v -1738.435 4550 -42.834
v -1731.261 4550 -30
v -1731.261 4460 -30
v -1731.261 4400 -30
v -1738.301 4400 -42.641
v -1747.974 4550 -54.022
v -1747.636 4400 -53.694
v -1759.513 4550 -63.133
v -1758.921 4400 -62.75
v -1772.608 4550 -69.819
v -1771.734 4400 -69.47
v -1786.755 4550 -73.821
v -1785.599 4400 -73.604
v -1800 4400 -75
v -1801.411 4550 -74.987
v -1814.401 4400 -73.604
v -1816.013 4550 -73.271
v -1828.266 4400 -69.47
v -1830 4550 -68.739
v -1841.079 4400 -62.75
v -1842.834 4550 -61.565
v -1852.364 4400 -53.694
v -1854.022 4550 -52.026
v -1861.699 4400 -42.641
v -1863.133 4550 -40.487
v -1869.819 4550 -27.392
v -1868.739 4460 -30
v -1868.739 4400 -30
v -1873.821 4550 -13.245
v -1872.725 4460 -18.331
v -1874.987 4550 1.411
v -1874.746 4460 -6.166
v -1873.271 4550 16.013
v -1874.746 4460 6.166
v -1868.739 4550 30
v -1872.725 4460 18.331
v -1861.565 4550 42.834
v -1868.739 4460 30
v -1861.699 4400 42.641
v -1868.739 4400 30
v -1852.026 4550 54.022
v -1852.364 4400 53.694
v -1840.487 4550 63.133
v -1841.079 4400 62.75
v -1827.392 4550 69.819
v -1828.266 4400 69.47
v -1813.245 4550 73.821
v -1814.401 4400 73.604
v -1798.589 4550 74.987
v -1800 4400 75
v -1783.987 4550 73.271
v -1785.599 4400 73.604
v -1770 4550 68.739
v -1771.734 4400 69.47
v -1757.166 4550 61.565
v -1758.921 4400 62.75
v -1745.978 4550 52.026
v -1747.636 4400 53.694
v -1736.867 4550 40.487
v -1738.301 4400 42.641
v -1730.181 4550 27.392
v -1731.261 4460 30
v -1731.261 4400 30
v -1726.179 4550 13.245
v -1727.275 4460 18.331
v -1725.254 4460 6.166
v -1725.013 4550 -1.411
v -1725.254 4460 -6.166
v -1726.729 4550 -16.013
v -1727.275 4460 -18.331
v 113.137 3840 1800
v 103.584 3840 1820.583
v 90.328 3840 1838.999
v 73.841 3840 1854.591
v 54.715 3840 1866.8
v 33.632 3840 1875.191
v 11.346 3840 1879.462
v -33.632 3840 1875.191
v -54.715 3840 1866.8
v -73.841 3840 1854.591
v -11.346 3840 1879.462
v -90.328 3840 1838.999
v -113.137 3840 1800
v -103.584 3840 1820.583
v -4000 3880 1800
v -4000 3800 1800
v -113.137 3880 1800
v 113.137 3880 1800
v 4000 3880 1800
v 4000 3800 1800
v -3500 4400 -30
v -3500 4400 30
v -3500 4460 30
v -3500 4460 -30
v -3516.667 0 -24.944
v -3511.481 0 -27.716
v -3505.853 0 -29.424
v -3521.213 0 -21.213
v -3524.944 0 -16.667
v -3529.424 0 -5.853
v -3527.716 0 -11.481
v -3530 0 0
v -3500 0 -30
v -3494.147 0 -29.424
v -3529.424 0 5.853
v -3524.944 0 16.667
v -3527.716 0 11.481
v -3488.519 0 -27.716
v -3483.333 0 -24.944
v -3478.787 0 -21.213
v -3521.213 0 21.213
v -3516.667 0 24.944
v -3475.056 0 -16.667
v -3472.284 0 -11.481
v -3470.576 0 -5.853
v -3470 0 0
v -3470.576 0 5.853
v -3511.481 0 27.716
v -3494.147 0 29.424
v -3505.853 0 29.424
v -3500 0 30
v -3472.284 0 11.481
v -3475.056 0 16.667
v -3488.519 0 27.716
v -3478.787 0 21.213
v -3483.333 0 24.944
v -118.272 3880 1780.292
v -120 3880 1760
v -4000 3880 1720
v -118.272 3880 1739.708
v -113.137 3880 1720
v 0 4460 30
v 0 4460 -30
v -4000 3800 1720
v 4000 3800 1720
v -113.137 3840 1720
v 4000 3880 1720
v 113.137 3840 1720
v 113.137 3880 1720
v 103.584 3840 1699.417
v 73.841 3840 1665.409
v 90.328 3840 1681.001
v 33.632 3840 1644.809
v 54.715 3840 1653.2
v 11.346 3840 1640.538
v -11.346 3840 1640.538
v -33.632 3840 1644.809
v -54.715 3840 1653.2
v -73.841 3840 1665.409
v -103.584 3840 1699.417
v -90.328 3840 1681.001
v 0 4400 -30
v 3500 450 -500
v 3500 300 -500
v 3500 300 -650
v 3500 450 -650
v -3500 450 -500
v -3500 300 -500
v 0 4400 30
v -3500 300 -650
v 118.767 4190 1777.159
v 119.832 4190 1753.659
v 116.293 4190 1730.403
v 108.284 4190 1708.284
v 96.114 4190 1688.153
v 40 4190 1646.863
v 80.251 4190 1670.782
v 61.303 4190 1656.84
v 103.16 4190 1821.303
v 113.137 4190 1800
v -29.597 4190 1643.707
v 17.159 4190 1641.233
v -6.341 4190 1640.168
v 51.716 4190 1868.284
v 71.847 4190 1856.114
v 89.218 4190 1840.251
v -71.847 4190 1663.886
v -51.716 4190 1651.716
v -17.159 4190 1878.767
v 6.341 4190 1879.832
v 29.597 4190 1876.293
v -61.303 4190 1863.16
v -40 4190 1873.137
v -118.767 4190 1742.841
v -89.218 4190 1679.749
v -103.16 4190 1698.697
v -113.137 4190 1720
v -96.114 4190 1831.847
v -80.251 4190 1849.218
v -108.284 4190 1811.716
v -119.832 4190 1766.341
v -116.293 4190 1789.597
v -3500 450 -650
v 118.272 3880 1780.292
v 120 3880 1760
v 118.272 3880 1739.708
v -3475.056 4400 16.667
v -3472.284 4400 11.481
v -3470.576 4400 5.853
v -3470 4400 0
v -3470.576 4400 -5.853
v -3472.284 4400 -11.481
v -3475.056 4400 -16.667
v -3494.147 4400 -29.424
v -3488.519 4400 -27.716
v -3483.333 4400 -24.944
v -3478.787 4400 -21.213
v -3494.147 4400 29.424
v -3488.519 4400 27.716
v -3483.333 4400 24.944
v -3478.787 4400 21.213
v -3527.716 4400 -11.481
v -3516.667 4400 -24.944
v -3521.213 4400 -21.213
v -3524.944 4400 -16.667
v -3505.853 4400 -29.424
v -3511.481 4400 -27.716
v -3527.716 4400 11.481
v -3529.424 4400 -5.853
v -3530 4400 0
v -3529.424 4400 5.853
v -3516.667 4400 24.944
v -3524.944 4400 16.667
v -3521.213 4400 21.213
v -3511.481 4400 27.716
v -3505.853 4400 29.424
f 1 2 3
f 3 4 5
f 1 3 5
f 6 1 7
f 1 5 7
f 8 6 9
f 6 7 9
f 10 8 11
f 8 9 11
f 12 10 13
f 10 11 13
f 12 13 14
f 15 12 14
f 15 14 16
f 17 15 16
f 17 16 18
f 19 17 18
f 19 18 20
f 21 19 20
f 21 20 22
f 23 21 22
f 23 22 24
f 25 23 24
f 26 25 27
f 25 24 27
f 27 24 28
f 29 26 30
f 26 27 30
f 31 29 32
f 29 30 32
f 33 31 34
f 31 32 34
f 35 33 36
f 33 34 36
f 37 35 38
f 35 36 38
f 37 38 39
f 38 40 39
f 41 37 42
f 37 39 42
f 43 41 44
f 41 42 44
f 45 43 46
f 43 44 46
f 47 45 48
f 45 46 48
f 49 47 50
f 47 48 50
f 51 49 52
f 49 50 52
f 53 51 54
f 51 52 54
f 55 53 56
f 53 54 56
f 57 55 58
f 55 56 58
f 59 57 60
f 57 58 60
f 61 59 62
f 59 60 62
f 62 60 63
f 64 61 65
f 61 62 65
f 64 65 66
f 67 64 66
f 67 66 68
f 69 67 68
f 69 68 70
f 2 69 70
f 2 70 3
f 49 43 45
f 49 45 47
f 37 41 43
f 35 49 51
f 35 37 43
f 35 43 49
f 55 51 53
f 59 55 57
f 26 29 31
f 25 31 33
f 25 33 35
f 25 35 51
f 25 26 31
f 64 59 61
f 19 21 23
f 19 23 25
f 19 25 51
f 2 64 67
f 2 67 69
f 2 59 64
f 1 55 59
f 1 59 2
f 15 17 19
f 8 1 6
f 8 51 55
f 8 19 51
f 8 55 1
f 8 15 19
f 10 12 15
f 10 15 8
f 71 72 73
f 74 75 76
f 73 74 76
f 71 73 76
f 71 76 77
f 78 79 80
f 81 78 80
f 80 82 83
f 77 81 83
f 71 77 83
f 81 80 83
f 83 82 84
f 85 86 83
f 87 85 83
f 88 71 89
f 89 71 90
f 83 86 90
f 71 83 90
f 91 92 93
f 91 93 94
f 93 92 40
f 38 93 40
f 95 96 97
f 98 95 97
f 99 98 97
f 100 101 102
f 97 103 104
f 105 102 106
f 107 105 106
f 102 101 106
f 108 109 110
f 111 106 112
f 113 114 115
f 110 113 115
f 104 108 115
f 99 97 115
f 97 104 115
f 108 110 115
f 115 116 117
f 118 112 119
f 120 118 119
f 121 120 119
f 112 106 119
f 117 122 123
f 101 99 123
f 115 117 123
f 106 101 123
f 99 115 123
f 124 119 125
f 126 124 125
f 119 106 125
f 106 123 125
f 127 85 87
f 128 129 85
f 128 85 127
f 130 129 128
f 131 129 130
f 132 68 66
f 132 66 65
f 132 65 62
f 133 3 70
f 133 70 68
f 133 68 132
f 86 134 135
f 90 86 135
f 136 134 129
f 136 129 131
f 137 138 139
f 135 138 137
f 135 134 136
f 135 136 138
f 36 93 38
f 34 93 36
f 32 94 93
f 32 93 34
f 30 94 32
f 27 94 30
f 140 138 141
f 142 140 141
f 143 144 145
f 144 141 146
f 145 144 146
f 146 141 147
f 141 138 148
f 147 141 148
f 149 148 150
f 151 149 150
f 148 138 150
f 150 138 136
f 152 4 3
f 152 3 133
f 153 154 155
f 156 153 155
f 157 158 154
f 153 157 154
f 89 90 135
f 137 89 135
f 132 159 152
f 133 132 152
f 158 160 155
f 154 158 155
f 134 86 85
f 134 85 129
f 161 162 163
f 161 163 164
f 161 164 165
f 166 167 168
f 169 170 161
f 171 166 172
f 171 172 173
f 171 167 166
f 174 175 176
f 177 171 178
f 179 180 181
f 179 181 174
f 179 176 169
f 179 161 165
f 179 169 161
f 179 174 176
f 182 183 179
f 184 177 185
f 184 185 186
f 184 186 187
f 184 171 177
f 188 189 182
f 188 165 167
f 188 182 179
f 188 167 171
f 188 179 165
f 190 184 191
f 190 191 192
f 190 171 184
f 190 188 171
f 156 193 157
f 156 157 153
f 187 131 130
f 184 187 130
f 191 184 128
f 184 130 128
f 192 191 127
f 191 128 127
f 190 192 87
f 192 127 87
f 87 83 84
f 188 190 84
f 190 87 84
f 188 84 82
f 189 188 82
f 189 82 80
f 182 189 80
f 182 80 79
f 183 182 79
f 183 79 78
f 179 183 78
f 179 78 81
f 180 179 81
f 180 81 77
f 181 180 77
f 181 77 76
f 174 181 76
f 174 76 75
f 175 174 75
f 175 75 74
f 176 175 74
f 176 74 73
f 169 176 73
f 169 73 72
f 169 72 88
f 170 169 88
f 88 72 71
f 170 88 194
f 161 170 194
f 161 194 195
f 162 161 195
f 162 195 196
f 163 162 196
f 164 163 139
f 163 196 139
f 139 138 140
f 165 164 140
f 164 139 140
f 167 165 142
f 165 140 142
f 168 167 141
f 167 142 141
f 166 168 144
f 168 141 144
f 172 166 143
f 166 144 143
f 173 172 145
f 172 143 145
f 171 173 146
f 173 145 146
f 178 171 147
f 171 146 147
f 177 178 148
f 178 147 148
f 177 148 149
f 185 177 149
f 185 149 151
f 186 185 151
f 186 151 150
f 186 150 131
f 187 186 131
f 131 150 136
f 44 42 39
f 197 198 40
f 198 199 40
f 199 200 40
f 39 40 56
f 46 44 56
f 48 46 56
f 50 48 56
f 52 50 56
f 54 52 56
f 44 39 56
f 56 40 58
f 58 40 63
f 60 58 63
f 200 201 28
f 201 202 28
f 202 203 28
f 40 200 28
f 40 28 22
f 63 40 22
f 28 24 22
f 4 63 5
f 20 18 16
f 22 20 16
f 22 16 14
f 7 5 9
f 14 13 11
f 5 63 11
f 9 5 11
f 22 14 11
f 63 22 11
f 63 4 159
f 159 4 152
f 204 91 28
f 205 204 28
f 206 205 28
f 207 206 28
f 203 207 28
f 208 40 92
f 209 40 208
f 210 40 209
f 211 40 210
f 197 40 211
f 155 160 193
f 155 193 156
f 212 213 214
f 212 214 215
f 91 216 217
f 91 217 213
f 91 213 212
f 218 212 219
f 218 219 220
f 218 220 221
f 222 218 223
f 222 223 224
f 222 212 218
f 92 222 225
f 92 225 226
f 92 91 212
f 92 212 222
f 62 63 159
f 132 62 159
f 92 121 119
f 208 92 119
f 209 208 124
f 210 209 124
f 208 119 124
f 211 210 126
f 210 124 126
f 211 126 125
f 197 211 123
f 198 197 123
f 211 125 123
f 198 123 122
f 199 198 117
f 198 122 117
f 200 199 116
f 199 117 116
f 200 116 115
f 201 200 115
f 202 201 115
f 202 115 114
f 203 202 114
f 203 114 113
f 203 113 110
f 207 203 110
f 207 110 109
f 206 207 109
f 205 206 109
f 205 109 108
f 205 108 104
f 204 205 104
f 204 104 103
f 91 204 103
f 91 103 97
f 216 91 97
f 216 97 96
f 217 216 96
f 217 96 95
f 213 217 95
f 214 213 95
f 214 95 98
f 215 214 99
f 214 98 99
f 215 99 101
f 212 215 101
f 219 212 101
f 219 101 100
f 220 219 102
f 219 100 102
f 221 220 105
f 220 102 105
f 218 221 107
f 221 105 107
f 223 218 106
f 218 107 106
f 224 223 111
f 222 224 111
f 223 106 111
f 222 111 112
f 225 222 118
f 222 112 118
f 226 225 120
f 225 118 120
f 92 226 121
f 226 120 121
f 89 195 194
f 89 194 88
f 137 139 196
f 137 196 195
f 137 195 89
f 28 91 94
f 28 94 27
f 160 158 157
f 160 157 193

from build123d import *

# Parameters (mm, degrees)
SKETCH1_R           = 30
BOSS_EXTRUDE1_DEPTH = 4400
BOSS_EXTRUDE2_START = 4400
SKETCH2_W           = 3500
SKETCH2_H           = 60
BOSS_EXTRUDE2_DEPTH = 60
BOSS_EXTRUDE3_START = 4400
SKETCH3_R           = 75
BOSS_EXTRUDE3_DEPTH = 150
BOSS_EXTRUDE4_START = 3800
SKETCH4_W           = 8000
SKETCH4_H           = 80
BOSS_EXTRUDE4_DEPTH = 80
BOSS_EXTRUDE5_START = 3840
SKETCH5_R           = 120
BOSS_EXTRUDE5_DEPTH = 350
BOSS_EXTRUDE6_START = 300
SKETCH6_W           = 7000
SKETCH6_H           = 150
BOSS_EXTRUDE6_DEPTH = 150


with BuildPart() as part:
    # Sketch1 → Boss-Extrude1 (new body)
    with BuildSketch(Plane(origin=(0, 0, 0), x_dir=(1, 0, 0), z_dir=(0, 1, 0))):
        with Locations(Location((-3500, 0, 0), (0, 0, 270))):
            Circle(SKETCH1_R)
    extrude(amount=BOSS_EXTRUDE1_DEPTH)

    # Sketch2 → Boss-Extrude2 (add)
    with BuildSketch(Plane(origin=(0, 0, 0), x_dir=(1, 0, 0), z_dir=(0, 1, 0)).offset(BOSS_EXTRUDE2_START)):
        with Locations((-1750, 0)):
            Rectangle(SKETCH2_W, SKETCH2_H)
    extrude(amount=BOSS_EXTRUDE2_DEPTH)

    # Sketch3 → Boss-Extrude3 (add)
    with BuildSketch(Plane(origin=(0, 0, 0), x_dir=(1, 0, 0), z_dir=(0, 1, 0)).offset(BOSS_EXTRUDE3_START)):
        with Locations(Location((-1800, 0, 0), (0, 0, 23.578178478))):
            Circle(SKETCH3_R)
    extrude(amount=BOSS_EXTRUDE3_DEPTH)


with BuildPart() as body_2:
    # Sketch4 → Boss-Extrude4 (new body)
    with BuildSketch(Plane(origin=(0, 0, 0), x_dir=(1, 0, 0), z_dir=(0, 1, 0)).offset(BOSS_EXTRUDE4_START)):
        with Locations((0, -1760)):
            Rectangle(SKETCH4_W, SKETCH4_H)
    extrude(amount=BOSS_EXTRUDE4_DEPTH)

    # Sketch5 → Boss-Extrude5 (add)
    with BuildSketch(Plane(origin=(0, 0, 0), x_dir=(1, 0, 0), z_dir=(0, 1, 0)).offset(BOSS_EXTRUDE5_START)):
        with Locations(Location((0, -1760, 0), (0, 0, 160.528779366))):
            Circle(SKETCH5_R)
    extrude(amount=BOSS_EXTRUDE5_DEPTH)


with BuildPart() as body_3:
    # Sketch6 → Boss-Extrude6 (new body)
    with BuildSketch(Plane(origin=(0, 0, 0), x_dir=(1, 0, 0), z_dir=(0, 1, 0)).offset(BOSS_EXTRUDE6_START)):
        with Locations((0, 575)):
            Rectangle(SKETCH6_W, SKETCH6_H)
    extrude(amount=BOSS_EXTRUDE6_DEPTH)


solid = Compound([part.part, body_2.part, body_3.part])
